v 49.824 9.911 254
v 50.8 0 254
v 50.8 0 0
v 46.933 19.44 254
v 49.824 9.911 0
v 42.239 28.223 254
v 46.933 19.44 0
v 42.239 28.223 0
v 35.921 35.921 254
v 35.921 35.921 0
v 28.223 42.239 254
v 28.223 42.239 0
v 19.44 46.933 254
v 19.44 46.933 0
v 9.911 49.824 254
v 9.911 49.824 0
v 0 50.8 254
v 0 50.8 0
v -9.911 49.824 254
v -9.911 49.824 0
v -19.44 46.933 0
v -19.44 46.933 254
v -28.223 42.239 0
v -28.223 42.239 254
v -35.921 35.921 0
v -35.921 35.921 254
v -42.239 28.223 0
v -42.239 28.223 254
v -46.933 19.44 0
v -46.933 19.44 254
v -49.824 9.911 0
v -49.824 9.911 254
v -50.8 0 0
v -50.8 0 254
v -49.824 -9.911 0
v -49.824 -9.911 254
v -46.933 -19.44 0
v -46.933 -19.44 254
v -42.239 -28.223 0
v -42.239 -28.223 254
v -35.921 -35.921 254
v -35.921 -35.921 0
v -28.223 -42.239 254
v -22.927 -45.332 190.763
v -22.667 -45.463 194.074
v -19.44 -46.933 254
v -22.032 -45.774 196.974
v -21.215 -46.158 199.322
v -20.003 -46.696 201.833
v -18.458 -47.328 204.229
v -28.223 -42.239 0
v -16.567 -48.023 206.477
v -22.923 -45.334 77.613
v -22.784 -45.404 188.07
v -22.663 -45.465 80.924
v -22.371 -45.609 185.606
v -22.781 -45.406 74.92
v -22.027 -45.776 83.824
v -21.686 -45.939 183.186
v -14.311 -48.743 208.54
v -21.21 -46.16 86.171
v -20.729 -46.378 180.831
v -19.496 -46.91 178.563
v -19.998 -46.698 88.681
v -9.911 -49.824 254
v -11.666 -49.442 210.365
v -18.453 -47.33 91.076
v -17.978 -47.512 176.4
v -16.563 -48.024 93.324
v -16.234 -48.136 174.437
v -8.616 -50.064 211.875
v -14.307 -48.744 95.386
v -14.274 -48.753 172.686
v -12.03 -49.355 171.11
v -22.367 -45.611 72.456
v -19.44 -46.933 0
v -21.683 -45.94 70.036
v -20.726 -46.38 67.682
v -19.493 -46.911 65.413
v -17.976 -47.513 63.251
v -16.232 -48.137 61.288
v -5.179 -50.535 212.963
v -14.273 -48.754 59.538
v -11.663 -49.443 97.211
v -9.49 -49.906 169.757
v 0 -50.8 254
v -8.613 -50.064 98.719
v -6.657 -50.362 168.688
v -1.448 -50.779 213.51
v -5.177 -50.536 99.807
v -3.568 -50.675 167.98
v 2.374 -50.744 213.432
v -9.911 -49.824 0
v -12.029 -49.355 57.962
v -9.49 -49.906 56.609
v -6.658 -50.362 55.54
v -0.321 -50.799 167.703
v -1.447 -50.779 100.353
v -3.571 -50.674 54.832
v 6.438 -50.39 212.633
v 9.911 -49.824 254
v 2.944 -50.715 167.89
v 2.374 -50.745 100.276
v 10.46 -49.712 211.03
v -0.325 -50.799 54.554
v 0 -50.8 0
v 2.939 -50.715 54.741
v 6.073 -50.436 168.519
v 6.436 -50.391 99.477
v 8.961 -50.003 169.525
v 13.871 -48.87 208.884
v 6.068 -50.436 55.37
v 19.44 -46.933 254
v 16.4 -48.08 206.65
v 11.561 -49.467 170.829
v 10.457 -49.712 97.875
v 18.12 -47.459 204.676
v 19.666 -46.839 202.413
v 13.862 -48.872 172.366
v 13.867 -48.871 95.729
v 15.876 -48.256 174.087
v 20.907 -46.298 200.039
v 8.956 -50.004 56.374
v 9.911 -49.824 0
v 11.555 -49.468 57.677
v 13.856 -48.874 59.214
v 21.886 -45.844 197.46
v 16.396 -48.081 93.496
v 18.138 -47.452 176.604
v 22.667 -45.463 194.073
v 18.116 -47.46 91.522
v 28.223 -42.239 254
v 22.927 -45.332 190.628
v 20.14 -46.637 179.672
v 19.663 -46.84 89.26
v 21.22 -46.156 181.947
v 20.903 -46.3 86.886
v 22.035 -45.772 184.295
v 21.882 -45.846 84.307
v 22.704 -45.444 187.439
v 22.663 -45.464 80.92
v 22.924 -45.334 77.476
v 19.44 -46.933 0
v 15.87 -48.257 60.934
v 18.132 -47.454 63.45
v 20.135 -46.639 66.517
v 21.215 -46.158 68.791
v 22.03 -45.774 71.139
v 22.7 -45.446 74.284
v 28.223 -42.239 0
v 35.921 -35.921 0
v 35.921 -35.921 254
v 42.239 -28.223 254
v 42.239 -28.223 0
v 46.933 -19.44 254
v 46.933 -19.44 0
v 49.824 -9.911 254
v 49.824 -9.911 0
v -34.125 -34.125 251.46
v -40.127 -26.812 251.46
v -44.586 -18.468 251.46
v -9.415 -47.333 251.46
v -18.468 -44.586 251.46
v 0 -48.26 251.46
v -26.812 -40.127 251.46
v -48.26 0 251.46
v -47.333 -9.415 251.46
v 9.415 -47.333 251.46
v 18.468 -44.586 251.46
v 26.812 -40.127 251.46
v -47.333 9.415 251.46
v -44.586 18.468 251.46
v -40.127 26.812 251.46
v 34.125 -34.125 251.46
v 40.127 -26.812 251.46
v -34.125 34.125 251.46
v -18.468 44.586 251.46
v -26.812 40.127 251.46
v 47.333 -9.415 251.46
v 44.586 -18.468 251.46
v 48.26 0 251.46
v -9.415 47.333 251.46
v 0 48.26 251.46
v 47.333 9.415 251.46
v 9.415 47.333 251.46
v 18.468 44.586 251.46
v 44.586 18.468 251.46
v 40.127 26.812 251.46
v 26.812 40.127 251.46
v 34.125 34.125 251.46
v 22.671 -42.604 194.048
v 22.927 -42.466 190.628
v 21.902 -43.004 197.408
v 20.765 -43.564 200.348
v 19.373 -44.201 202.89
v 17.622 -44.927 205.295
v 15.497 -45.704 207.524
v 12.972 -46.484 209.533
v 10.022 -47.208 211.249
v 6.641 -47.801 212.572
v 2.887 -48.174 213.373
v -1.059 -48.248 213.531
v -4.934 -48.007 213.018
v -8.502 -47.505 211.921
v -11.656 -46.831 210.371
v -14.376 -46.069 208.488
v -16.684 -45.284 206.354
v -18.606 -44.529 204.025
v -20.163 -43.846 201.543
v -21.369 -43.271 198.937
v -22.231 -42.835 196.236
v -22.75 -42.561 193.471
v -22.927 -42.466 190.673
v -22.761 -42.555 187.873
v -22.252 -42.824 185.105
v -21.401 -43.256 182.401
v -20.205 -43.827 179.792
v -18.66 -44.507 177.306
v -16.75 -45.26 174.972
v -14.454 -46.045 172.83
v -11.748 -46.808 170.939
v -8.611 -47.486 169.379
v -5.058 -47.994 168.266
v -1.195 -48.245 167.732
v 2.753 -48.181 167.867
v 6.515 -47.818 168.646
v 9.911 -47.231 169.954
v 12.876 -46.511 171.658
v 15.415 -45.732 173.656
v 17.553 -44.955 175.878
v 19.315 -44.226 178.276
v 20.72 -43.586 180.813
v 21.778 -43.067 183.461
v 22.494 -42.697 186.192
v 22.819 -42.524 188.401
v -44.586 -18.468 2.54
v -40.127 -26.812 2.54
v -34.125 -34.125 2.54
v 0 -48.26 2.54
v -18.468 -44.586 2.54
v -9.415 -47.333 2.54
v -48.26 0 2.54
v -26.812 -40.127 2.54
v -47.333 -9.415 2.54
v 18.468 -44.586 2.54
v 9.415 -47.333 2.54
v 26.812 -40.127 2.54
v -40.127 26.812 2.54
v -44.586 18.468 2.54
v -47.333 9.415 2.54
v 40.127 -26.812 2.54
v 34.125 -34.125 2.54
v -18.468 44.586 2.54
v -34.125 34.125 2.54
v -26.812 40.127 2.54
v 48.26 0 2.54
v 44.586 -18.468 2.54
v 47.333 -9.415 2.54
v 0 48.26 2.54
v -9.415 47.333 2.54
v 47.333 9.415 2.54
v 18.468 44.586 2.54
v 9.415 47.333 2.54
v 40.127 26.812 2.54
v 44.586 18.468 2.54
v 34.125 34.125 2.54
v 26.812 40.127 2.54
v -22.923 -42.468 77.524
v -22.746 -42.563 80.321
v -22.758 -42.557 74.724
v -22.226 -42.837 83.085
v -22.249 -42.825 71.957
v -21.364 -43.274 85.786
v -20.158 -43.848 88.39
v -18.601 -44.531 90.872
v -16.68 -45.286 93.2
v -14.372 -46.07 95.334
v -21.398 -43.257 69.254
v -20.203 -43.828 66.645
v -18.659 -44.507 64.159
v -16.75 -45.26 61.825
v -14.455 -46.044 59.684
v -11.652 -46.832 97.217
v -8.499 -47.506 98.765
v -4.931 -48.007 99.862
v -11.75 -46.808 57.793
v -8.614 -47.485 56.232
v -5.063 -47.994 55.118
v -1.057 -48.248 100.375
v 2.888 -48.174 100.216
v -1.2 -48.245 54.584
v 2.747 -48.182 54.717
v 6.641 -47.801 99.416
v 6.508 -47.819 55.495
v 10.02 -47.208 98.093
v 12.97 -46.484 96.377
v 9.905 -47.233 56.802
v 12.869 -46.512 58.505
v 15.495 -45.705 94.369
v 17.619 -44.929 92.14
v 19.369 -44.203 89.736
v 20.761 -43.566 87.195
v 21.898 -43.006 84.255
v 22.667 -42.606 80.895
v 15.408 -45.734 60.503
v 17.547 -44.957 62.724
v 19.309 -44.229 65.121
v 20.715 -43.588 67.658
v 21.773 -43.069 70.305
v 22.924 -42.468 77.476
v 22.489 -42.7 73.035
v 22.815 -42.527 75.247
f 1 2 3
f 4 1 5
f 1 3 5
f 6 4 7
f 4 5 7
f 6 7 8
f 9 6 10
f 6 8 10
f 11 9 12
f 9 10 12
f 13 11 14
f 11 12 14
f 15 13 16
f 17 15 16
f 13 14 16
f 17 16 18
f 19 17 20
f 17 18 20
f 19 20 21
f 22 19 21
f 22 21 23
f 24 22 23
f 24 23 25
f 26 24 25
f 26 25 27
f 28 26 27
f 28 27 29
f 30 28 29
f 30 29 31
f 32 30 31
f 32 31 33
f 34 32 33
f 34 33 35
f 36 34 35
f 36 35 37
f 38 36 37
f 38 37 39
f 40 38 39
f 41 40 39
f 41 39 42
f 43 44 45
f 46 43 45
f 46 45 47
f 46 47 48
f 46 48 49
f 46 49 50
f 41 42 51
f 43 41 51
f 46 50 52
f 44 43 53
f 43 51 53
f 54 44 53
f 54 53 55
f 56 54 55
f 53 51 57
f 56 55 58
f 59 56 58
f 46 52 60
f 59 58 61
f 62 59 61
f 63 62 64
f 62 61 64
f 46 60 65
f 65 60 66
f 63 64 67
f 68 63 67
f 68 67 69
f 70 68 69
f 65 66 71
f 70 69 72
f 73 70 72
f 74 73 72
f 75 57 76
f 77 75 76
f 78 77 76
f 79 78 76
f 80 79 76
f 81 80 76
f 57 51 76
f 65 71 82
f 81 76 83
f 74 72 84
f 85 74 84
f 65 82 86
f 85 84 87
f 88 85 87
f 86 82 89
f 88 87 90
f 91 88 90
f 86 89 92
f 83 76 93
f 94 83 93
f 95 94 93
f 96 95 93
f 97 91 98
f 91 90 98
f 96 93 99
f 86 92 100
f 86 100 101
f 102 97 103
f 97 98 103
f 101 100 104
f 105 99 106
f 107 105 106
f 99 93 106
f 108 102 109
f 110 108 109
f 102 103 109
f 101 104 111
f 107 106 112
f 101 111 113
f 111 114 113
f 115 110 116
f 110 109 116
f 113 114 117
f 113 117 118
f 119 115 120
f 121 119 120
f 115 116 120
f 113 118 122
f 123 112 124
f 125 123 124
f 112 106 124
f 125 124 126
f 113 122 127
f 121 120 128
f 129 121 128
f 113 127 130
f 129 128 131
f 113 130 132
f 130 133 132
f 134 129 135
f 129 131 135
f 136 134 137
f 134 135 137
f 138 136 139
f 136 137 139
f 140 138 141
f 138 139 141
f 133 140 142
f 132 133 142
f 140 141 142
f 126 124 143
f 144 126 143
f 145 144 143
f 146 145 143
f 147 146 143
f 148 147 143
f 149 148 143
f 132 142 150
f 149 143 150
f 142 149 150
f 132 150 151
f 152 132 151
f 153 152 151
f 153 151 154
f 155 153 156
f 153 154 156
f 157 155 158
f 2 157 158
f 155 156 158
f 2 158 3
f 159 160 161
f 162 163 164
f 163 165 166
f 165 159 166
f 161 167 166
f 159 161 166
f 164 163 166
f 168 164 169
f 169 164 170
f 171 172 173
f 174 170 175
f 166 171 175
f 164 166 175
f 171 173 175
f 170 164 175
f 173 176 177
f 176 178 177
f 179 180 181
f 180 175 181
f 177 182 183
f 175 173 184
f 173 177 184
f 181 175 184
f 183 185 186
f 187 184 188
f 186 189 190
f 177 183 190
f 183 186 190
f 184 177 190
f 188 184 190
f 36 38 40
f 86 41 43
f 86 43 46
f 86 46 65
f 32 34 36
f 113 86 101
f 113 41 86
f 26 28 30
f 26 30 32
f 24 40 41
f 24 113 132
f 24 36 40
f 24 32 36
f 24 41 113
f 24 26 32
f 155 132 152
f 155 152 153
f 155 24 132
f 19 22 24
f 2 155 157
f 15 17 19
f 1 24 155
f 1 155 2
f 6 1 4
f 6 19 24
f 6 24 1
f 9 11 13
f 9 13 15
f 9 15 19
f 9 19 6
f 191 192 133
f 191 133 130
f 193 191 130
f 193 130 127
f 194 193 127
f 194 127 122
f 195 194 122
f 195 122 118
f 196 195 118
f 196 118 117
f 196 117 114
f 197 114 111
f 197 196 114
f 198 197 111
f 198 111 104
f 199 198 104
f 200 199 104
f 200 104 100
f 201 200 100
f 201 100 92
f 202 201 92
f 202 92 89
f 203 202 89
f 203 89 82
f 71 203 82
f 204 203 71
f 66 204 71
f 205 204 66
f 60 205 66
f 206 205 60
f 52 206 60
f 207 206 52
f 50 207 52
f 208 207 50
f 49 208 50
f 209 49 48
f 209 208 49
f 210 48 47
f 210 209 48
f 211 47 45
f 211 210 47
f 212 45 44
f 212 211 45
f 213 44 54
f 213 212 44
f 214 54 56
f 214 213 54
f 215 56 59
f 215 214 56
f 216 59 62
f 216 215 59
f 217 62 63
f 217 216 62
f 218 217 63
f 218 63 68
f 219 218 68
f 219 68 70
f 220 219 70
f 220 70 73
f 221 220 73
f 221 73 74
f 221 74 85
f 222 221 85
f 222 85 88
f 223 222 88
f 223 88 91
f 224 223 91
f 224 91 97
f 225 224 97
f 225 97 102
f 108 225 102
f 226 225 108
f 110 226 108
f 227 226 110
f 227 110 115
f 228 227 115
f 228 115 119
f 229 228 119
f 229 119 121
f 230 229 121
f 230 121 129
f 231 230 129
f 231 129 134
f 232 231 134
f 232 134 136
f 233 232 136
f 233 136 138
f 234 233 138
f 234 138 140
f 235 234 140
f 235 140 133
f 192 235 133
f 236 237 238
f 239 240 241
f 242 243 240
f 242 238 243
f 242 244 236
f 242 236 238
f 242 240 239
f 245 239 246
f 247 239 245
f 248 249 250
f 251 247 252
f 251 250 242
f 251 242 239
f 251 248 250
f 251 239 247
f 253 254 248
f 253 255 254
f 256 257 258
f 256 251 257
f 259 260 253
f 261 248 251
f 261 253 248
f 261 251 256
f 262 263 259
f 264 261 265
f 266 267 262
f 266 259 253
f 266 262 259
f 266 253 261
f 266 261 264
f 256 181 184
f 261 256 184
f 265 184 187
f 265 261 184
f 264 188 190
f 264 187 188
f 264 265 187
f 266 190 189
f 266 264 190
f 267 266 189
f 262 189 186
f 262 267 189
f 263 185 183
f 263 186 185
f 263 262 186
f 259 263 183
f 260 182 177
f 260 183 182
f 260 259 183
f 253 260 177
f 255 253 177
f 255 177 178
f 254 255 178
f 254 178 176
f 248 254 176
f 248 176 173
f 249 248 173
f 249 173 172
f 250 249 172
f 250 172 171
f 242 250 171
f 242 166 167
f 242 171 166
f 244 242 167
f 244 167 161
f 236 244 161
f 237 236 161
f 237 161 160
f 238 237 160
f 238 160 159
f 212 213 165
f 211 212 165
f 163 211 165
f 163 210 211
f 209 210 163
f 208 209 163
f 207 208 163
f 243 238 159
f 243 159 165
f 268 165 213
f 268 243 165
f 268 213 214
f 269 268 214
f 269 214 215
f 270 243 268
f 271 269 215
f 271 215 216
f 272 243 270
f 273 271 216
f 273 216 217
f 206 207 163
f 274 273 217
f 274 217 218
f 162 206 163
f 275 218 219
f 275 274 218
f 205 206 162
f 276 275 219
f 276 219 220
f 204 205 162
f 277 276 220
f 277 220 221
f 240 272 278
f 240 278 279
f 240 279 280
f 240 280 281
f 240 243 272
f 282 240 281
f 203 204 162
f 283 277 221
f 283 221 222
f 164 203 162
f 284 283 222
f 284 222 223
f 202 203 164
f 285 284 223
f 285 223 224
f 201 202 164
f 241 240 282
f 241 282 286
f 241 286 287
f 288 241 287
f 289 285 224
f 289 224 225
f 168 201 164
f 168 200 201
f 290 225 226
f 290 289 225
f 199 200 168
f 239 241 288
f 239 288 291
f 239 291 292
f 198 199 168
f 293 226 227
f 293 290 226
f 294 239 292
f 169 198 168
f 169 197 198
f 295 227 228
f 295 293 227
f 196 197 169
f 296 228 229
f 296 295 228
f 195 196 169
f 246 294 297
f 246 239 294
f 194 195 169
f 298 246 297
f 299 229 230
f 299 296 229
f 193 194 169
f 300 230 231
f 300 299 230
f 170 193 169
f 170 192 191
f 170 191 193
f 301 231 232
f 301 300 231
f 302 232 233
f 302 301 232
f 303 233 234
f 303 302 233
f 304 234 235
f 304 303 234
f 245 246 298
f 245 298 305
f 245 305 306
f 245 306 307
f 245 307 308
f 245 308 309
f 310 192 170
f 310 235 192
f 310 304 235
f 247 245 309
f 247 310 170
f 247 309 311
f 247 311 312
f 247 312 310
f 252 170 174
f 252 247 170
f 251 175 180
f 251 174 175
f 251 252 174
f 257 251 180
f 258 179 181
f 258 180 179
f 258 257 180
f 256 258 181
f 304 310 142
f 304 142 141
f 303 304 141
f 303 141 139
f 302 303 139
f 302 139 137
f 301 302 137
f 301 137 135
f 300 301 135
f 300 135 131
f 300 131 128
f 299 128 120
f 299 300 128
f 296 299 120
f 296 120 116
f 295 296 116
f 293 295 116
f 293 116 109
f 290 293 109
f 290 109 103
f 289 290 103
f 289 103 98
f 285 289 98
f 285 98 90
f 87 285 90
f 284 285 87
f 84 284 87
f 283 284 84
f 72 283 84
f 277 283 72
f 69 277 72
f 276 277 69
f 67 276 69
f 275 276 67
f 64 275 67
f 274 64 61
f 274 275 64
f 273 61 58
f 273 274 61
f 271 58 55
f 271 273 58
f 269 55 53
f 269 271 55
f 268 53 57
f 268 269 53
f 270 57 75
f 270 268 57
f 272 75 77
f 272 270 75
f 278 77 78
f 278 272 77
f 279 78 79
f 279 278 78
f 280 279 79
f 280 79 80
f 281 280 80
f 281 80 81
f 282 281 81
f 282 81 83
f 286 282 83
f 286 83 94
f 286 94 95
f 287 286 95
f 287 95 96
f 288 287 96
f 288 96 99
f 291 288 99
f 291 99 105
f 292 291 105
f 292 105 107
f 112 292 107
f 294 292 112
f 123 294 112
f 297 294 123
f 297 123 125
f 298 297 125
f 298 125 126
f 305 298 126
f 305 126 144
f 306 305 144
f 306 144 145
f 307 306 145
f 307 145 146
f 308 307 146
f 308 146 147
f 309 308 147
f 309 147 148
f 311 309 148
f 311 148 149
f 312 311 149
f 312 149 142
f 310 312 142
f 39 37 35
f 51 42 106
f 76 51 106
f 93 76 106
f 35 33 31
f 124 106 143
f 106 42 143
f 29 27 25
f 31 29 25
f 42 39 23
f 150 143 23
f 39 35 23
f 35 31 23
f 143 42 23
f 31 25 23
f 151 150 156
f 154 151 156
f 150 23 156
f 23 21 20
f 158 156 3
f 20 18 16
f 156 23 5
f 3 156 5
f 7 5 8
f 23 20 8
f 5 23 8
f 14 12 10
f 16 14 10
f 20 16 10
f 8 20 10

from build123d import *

# Parameters (mm, degrees)
F0_R     = 50.8
F1_DEPTH = 254
F2_T     = -2.54
F3_R     = 22.9273232768
F4_DEPTH = 152.908
F5_R     = 22.9235
F6_DEPTH = 92.202


with BuildPart() as f1:
    # F0 (on Top) → F1 (new body)
    with BuildSketch(Plane.XY):
        Circle(F0_R)
    extrude(amount=F1_DEPTH)

    # F2 (hollow: no face is removed)
    offset(amount=F2_T, mode=Mode.SUBTRACT)

    # F3 (on Front) → F4 (cut)
    with BuildSketch(Plane.XZ):
        with Locations((0, 190.627977252)):
            Circle(F3_R)
    extrude(amount=F4_DEPTH, mode=Mode.SUBTRACT)

    # F5 (on Front) → F6 (cut)
    with BuildSketch(Plane.XZ):
        with Locations((0, 77.4756367312)):
            Circle(F5_R)
    extrude(amount=F6_DEPTH, mode=Mode.SUBTRACT)


solid = f1.part
